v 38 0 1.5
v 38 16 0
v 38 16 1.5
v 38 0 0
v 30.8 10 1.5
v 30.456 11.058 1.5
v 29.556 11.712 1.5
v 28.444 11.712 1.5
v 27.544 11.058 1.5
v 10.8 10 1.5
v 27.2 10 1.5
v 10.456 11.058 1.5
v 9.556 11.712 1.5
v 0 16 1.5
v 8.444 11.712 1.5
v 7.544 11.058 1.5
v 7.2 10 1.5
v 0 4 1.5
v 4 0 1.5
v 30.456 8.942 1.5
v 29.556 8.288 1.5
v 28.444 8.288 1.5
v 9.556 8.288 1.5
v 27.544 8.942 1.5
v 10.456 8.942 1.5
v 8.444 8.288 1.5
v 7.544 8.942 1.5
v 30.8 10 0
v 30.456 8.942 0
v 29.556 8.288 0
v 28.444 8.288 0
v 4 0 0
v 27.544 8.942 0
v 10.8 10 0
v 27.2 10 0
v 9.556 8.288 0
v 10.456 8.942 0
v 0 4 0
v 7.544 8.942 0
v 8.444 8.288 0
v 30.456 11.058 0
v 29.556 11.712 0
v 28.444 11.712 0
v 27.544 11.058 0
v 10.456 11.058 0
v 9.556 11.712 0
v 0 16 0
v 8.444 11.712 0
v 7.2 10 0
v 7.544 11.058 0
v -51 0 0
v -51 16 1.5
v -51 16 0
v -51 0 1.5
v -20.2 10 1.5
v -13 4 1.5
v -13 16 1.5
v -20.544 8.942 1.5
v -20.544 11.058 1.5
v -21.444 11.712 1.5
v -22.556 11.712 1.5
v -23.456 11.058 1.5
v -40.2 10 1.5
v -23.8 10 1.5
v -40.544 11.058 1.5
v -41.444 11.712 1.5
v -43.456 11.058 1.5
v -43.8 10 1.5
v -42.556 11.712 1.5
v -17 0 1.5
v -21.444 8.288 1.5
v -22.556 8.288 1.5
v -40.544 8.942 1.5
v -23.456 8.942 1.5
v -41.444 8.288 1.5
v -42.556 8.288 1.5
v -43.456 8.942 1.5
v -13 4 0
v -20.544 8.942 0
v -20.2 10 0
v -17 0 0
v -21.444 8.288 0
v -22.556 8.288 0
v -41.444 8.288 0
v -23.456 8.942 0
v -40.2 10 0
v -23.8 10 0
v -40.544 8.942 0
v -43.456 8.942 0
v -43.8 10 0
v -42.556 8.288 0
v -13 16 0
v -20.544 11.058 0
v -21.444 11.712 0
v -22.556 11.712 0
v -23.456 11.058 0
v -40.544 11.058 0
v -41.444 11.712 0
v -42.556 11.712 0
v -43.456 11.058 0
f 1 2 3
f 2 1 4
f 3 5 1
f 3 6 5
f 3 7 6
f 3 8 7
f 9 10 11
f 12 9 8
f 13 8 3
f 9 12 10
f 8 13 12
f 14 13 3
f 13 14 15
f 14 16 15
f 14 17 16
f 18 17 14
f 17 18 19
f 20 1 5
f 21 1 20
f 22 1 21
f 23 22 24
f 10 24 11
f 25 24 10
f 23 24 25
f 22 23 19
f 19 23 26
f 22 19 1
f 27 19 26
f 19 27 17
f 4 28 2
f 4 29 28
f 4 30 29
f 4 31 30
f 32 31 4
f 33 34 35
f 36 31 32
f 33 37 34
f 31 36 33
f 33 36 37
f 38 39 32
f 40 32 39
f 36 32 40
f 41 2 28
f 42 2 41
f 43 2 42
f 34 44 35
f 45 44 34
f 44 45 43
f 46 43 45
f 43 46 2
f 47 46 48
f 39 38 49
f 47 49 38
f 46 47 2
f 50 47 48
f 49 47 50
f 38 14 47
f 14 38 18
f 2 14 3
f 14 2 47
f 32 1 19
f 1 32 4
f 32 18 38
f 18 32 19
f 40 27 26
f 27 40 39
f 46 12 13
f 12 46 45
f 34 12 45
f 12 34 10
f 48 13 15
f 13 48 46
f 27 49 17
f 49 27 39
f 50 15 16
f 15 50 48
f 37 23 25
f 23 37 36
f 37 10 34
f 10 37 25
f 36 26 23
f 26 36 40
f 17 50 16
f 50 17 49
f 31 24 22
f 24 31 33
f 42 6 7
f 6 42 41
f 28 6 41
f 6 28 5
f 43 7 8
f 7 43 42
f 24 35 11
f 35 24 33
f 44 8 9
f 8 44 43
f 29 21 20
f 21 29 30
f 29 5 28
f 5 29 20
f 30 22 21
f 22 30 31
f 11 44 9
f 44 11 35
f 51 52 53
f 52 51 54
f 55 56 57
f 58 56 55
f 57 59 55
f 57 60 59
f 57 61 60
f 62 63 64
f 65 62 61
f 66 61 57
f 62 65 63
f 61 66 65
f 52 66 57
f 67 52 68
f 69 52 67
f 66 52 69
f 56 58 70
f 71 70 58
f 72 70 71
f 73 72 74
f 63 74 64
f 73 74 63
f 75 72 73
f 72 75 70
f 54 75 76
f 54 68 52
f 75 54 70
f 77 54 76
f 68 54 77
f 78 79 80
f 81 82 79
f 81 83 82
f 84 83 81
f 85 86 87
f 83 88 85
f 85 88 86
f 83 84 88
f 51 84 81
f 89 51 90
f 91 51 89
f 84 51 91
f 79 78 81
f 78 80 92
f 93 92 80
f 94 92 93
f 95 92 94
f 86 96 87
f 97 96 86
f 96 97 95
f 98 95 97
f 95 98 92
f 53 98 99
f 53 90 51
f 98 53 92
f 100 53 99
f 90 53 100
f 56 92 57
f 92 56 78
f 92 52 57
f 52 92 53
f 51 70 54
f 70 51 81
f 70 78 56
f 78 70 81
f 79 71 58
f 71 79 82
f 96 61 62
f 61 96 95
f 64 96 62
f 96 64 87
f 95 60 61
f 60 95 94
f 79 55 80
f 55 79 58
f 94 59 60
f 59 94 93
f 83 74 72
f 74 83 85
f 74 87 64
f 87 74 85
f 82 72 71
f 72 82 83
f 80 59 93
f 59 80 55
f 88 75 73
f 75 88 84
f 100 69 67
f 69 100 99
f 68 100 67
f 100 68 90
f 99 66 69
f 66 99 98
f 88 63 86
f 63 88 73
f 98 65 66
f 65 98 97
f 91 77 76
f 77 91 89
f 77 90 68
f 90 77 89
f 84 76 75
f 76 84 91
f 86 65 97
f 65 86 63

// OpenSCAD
// [FL_INDEX: keywords="openscad, 3d_parametric, i3_z-axis-top_separator, csg_solid" | COT="Parametric OpenSCAD design from 3DCodeverse"]
// Title: i3 z-axis-top separator

// Thickness of separation
sep = 1.5;

module z_top_sep_base() {
  difference() {
    cube([38,16,sep]);
    translate([5,-1,-1]) rotate([0,0,135]) cube([10,10,2+sep]);
  }
}

module z_top_sep_holes() {
  // holes
  translate([9,10,-1]) cylinder(r = 1.8, h = 2+sep, $fn = 10);
  translate([29,10,-1]) cylinder(r = 1.8, h = 2+sep, $fn = 10);
}

module z_top_sep() {
  difference() {
    z_top_sep_base();
    z_top_sep_holes();
  }
}

z_top_sep();
translate([-13,0,0]) mirror([1,0,0]) z_top_sep();
